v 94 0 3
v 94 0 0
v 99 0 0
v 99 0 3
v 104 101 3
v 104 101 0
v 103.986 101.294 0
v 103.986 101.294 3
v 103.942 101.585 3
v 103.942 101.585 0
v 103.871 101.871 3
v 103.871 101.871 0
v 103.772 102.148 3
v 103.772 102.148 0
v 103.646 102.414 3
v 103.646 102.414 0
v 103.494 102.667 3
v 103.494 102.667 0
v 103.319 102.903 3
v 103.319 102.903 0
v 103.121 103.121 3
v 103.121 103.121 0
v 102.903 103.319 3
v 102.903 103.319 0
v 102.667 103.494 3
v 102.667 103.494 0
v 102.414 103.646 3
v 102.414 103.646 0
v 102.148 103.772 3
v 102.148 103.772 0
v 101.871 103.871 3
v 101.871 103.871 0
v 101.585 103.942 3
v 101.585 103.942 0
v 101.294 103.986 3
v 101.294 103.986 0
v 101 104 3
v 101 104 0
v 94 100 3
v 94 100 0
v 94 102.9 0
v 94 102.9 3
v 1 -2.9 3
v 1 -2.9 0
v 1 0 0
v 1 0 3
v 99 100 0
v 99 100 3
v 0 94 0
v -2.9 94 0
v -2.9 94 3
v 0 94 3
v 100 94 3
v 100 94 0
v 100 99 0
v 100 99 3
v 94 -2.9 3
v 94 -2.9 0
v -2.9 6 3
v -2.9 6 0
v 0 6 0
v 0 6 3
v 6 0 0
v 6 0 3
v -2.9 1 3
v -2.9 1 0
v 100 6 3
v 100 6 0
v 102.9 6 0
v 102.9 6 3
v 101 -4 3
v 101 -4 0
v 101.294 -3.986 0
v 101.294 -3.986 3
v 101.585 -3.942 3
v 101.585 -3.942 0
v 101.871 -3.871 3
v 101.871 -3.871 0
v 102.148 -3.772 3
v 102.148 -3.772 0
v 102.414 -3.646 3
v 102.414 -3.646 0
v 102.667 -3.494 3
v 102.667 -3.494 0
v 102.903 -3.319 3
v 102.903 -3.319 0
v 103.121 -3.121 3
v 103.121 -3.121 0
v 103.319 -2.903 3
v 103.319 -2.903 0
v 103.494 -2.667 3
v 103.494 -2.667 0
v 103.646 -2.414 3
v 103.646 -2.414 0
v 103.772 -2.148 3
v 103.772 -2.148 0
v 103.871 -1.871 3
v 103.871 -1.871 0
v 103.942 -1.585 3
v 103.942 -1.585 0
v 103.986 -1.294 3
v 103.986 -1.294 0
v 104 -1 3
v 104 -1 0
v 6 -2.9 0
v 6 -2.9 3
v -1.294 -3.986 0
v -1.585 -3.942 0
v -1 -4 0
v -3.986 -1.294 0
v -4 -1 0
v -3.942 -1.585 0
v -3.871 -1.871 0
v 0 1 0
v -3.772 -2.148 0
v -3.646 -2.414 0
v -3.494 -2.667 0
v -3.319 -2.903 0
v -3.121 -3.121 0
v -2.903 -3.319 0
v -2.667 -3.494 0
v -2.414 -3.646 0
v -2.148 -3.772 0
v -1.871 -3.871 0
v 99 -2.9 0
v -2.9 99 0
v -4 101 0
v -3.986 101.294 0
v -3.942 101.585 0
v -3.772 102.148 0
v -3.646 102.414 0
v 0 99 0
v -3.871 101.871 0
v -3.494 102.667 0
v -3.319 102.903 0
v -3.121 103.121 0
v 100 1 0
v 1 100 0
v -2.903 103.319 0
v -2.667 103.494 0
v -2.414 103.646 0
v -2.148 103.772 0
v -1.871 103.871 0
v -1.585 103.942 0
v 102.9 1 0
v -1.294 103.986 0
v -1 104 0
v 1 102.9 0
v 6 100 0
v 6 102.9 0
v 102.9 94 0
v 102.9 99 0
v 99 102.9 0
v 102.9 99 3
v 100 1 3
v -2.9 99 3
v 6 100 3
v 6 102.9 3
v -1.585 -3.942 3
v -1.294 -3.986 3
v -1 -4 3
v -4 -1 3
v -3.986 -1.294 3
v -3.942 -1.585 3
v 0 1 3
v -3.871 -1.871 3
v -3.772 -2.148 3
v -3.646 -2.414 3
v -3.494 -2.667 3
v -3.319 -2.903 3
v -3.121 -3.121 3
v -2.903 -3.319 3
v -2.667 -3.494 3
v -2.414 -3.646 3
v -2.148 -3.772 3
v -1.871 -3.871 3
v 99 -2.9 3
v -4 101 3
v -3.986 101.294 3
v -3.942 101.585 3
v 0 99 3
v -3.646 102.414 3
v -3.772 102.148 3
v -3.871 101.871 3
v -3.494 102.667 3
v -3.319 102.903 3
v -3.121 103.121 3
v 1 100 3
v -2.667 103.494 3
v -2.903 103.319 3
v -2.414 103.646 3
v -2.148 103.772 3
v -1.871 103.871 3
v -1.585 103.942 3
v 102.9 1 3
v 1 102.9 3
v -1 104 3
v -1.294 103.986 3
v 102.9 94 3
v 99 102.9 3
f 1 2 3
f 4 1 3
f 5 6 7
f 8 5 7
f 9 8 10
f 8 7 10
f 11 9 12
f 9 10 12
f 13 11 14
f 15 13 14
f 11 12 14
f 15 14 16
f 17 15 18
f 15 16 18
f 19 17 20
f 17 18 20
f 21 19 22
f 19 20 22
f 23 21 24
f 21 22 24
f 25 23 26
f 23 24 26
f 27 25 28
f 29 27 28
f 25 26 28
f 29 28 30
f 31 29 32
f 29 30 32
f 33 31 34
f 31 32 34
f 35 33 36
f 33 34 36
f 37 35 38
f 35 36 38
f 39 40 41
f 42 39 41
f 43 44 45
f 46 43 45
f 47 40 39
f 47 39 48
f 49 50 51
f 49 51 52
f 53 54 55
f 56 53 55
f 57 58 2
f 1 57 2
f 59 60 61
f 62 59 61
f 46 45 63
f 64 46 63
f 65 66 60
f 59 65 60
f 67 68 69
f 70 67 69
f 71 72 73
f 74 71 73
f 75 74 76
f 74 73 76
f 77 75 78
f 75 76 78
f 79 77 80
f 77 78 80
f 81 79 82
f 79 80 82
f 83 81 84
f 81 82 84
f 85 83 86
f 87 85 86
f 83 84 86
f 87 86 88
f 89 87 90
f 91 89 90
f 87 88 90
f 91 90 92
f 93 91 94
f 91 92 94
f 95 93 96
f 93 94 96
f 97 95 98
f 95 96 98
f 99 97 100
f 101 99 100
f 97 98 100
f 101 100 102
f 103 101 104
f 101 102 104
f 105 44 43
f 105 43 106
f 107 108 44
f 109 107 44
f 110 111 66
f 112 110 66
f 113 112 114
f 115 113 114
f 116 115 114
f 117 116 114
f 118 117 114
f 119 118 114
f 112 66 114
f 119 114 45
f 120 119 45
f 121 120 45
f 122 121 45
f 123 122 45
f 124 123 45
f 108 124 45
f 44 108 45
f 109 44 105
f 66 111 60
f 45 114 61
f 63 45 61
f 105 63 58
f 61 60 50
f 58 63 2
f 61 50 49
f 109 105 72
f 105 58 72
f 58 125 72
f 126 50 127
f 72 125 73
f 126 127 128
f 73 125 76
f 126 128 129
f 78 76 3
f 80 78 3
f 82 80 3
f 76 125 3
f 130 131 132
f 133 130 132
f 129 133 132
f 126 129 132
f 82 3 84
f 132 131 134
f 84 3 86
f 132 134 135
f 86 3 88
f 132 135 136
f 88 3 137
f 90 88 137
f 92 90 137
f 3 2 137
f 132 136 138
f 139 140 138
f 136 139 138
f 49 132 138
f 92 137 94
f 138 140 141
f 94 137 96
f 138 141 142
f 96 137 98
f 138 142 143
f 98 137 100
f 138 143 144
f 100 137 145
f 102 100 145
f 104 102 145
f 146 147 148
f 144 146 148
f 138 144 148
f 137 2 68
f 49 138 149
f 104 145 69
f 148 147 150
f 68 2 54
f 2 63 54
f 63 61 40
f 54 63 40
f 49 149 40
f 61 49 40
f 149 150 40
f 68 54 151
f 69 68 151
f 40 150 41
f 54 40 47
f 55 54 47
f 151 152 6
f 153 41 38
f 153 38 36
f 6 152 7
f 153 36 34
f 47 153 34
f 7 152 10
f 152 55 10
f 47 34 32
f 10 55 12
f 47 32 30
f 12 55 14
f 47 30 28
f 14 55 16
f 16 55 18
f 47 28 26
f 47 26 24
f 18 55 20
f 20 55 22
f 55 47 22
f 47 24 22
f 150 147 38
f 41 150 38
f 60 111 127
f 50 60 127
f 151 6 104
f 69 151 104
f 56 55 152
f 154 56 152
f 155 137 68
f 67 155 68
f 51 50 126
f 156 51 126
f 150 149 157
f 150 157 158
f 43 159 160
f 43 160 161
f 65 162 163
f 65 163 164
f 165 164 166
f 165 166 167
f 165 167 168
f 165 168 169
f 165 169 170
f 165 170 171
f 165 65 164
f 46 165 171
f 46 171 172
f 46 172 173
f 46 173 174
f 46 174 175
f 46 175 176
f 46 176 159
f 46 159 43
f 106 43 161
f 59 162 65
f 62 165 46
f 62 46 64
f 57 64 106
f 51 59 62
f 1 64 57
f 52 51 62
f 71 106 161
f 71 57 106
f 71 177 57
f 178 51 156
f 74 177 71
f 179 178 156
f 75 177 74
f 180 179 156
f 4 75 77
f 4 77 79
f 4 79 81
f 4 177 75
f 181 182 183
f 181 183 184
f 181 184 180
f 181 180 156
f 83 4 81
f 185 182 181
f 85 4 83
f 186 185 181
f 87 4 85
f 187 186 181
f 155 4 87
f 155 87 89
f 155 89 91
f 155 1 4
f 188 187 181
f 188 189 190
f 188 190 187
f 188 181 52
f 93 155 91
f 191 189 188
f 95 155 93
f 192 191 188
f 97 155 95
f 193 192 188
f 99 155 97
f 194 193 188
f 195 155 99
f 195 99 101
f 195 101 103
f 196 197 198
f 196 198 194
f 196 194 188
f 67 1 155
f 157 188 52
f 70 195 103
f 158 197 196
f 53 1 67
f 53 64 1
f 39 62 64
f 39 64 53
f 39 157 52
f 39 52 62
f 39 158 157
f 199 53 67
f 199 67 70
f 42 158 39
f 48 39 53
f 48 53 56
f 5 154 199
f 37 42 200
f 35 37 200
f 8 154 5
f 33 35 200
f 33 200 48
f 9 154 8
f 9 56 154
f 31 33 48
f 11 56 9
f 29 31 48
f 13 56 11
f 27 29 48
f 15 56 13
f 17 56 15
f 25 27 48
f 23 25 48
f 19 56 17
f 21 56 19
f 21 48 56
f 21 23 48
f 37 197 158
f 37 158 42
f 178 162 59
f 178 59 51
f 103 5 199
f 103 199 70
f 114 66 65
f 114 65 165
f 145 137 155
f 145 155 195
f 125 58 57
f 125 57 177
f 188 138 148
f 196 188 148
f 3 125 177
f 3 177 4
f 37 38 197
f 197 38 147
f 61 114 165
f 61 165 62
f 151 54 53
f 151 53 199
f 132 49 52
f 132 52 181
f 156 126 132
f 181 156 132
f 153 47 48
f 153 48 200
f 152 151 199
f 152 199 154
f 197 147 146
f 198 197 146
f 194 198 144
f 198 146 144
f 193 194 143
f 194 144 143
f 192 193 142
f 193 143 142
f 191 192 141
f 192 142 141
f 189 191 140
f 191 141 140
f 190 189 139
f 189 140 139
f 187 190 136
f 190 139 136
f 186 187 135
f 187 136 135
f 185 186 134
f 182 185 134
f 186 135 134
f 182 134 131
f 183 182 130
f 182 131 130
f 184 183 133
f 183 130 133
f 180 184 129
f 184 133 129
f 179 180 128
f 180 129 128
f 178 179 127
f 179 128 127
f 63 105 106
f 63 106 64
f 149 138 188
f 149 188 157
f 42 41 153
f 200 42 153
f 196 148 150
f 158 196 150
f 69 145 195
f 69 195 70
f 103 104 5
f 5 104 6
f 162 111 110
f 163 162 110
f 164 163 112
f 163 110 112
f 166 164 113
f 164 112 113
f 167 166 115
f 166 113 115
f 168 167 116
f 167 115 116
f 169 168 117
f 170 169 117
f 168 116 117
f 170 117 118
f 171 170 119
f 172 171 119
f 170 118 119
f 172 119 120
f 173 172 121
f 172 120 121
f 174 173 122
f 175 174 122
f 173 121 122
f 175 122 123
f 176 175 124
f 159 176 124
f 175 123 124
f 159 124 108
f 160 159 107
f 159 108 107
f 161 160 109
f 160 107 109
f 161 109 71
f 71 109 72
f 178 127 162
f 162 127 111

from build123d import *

# Parameters (mm, degrees)
SKETCH_2_W      = 5
SKETCH_2_H      = 2.9
SKETCH_2_W_2    = 2.9
SKETCH_2_H_2    = 5
EXTRUDE_4_DEPTH = 3


with BuildPart() as part:
    # 草图2 → 凸台-拉伸4 (new body)
    with BuildSketch(Plane.XY):
        with BuildLine():
            Line((101, 104), (-1, 104))
            ThreePointArc((-1, 104), (-3.121320344, 103.121320344), (-4, 101))
            Line((-4, 101), (-4, -1))
            ThreePointArc((-4, -1), (-3.121320344, -3.121320344), (-1, -4))
            Line((-1, -4), (101, -4))
            ThreePointArc((101, -4), (103.121320344, -3.121320344), (104, -1))
            Line((104, -1), (104, 101))
            ThreePointArc((104, 101), (103.121320344, 103.121320344), (101, 104))
        make_face()
        with Locations((3.5, -1.45)):
            Rectangle(SKETCH_2_W, SKETCH_2_H, mode=Mode.SUBTRACT)
        with Locations((-1.45, 3.5)):
            Rectangle(SKETCH_2_W_2, SKETCH_2_H_2, mode=Mode.SUBTRACT)
        with Locations((3.5, 101.45)):
            Rectangle(SKETCH_2_W, SKETCH_2_H, mode=Mode.SUBTRACT)
        with Locations((101.45, 3.5)):
            Rectangle(SKETCH_2_W_2, SKETCH_2_H_2, mode=Mode.SUBTRACT)
        with Locations((96.5, -1.45)):
            Rectangle(SKETCH_2_W, SKETCH_2_H, mode=Mode.SUBTRACT)
        with Locations((101.45, 96.5)):
            Rectangle(SKETCH_2_W_2, SKETCH_2_H_2, mode=Mode.SUBTRACT)
        with Locations((96.5, 101.45)):
            Rectangle(SKETCH_2_W, SKETCH_2_H, mode=Mode.SUBTRACT)
        with Locations((-1.45, 96.5)):
            Rectangle(SKETCH_2_W_2, SKETCH_2_H_2, mode=Mode.SUBTRACT)
    extrude(amount=EXTRUDE_4_DEPTH)


solid = part.part
